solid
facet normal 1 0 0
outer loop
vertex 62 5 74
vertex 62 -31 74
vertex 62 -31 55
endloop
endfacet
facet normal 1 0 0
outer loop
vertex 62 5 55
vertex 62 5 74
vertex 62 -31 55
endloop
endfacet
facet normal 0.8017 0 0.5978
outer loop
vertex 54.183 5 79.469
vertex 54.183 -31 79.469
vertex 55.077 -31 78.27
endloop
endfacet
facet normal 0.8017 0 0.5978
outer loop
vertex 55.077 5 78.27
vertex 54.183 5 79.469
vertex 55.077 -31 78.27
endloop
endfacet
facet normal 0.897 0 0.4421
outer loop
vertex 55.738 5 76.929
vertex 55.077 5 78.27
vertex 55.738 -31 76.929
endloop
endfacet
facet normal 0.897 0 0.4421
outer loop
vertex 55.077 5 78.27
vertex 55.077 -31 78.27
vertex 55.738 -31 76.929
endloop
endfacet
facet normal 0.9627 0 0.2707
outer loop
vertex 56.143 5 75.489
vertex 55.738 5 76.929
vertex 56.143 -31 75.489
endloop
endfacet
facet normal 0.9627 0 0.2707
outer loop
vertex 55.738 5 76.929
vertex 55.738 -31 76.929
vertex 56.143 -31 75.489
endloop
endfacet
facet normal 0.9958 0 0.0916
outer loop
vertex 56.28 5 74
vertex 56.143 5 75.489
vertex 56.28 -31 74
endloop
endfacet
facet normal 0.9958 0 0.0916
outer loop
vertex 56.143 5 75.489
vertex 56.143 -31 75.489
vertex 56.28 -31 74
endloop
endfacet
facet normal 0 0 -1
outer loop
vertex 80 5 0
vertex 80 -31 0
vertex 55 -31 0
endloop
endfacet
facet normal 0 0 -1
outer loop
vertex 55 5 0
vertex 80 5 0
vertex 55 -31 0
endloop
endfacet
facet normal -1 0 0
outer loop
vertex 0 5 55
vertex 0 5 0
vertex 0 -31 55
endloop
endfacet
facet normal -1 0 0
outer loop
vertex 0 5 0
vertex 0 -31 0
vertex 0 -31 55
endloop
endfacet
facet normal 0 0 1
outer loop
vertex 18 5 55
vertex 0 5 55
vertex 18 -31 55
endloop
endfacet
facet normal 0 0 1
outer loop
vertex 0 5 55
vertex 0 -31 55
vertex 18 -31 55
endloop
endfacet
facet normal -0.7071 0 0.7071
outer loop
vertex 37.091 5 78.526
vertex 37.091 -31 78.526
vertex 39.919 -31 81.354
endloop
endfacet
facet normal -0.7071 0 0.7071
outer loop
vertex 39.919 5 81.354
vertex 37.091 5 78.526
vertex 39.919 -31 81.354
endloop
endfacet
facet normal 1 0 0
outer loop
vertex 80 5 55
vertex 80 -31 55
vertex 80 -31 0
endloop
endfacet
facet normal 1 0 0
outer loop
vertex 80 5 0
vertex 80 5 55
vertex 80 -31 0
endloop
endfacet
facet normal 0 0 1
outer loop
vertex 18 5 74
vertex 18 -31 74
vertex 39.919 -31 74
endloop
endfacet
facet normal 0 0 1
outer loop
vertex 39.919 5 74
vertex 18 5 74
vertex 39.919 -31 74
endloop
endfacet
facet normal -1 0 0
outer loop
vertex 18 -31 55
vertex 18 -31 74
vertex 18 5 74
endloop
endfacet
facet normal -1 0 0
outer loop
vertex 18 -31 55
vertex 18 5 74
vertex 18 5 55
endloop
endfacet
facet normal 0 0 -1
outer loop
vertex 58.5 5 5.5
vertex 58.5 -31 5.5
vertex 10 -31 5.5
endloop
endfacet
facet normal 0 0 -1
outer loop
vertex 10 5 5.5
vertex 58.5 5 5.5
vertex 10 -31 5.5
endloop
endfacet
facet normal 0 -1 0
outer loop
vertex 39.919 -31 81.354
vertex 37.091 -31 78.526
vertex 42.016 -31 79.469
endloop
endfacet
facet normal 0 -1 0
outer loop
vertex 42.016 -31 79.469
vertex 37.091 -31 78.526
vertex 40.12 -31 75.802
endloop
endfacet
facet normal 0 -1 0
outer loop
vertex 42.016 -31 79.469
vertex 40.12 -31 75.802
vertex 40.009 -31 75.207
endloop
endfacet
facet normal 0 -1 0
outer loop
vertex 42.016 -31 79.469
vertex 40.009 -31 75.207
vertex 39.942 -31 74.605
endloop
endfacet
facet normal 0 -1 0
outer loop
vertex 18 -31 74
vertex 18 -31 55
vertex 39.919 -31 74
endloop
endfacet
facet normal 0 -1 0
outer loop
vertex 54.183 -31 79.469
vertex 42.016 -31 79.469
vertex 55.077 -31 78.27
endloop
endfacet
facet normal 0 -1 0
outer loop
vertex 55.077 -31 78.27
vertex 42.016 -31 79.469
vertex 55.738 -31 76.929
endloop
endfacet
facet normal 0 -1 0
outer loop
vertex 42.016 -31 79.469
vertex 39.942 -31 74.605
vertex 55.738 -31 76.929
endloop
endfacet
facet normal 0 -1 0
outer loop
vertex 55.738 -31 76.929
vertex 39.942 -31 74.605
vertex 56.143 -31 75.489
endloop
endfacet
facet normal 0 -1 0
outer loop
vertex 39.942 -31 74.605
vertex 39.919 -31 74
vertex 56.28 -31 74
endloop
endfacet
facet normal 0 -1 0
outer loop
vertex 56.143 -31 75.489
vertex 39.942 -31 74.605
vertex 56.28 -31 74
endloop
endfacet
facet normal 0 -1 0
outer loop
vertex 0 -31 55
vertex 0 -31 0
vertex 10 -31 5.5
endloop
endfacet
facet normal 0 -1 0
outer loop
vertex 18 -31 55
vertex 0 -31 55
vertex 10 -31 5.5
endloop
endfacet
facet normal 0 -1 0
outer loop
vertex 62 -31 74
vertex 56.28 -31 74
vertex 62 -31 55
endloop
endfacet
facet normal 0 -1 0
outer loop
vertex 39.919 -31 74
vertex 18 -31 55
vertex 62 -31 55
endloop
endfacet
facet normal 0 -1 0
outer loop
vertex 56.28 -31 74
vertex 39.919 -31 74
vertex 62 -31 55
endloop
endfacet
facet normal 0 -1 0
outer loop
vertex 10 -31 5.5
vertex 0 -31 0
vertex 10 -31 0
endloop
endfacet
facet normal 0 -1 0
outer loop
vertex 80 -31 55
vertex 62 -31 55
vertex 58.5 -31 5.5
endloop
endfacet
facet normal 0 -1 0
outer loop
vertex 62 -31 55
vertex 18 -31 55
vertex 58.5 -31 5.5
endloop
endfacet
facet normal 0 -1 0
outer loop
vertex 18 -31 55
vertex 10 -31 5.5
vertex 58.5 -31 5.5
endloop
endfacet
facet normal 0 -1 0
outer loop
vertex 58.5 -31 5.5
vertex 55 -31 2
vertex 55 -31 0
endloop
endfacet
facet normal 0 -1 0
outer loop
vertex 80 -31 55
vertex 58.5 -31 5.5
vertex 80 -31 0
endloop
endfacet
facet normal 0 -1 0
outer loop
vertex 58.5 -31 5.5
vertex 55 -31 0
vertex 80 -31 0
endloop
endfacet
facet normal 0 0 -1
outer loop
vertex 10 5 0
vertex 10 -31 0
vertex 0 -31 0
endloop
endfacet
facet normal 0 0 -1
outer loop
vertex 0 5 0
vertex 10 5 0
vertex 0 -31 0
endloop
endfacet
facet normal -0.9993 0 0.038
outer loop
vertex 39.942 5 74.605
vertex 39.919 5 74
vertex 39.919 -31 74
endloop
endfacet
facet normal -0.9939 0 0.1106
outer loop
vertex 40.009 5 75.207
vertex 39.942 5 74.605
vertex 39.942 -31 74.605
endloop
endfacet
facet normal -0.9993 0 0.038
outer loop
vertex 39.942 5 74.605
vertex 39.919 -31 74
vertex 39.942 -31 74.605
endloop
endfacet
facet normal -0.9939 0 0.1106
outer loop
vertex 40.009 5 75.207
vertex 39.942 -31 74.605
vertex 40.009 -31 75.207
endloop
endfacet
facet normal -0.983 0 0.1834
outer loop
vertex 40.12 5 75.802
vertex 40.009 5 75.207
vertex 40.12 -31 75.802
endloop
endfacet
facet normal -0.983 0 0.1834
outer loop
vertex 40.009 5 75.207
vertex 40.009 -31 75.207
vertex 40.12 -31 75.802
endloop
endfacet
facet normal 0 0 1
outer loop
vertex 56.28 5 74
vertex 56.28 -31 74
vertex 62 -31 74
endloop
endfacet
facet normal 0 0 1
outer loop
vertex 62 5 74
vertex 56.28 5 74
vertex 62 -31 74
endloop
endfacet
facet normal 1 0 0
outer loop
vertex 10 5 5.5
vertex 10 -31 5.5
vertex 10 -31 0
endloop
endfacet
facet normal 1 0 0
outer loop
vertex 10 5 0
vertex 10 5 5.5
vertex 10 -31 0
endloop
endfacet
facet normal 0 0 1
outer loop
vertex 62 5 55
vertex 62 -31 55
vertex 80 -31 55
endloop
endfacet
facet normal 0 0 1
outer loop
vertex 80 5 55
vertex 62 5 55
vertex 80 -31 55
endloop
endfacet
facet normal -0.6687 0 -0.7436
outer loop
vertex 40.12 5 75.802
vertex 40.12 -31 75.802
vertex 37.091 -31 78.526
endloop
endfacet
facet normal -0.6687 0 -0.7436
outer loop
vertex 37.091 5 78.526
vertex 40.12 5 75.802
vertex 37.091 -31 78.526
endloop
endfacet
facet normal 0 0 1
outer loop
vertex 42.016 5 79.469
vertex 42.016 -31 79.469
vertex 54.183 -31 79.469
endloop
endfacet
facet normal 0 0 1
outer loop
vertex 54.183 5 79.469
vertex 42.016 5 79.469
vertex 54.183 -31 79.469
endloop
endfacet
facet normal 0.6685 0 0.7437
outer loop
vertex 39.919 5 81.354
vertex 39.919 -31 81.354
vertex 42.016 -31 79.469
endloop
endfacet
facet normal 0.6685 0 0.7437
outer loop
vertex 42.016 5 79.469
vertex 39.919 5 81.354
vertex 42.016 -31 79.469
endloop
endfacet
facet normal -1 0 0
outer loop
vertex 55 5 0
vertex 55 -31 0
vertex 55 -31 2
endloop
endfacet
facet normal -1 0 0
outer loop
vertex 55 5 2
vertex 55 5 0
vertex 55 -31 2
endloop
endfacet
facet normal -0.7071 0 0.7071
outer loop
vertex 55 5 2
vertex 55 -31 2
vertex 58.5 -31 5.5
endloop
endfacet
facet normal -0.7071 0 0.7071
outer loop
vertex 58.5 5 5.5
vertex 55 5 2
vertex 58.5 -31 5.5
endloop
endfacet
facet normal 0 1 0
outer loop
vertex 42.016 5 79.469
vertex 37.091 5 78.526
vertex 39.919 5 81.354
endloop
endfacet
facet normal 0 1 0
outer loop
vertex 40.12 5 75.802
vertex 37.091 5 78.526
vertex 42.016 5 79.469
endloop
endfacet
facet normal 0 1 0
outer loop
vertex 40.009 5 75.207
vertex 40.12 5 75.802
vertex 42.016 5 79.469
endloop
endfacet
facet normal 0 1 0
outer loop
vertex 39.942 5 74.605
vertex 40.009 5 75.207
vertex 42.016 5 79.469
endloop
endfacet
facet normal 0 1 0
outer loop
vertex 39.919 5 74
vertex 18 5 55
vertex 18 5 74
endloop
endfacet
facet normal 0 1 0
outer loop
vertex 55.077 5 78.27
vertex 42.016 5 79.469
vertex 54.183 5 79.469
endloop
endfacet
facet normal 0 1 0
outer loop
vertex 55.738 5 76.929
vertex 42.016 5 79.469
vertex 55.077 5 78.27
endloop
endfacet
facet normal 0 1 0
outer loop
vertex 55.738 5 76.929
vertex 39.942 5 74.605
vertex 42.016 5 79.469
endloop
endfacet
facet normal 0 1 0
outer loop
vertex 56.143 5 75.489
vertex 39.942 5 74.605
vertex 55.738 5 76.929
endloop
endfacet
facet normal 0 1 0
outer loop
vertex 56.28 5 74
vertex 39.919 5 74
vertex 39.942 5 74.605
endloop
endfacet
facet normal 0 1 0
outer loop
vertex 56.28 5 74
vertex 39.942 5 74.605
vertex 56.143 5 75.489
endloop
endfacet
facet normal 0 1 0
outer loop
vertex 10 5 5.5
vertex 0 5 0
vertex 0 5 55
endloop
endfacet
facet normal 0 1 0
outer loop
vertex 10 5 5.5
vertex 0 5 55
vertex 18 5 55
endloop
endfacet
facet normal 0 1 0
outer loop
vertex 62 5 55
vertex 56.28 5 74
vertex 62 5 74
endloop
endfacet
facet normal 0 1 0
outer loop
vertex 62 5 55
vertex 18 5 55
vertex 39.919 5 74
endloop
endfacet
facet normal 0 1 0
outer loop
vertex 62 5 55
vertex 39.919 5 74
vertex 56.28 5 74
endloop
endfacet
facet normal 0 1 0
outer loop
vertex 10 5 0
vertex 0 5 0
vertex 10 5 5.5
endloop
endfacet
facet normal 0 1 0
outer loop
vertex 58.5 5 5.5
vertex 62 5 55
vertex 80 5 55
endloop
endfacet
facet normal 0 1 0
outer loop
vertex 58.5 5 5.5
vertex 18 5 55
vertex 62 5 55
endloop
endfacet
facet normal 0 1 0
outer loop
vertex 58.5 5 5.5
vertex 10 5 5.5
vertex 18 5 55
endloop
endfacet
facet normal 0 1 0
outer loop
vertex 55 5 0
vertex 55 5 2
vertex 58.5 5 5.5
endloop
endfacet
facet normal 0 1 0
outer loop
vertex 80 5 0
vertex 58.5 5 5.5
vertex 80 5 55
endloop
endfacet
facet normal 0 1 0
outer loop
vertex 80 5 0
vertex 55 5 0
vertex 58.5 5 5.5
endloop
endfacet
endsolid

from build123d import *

# Parameters (mm, degrees)
SKETCH_6_W          = 80
SKETCH_6_H          = 31
EXTRUDE_1_DEPTH     = 85
SKETCH_8_W          = 18
SKETCH_8_H          = 30
CUT_EXTRUDE_1_DEPTH = 100
SKETCH_9_W          = 44
SKETCH_9_H          = 30
EXTRUDE_3_DEPTH     = 5
CUT_EXTRUDE_2_DEPTH = 110


with BuildPart() as part:
    # 草图6 → 凸台-拉伸1 (new body)
    with BuildSketch(Plane.XY):
        with Locations((40, -15.5)):
            Rectangle(SKETCH_6_W, SKETCH_6_H)
    extrude(amount=EXTRUDE_1_DEPTH)

    # 草图8 → 切除-拉伸1 (cut)
    with BuildSketch(Plane(origin=(0, 0, 0), x_dir=(1, 0, 0), z_dir=(0, 1, 0))):
        with Locations((71, -70)):
            Rectangle(SKETCH_8_W, SKETCH_8_H)
        with Locations((9, -70)):
            Rectangle(SKETCH_8_W, SKETCH_8_H)
    extrude(amount=-CUT_EXTRUDE_1_DEPTH, mode=Mode.SUBTRACT)

    # 草图9 → 凸台-拉伸3 (add)
    with BuildSketch(Plane(origin=(0, 0, 0), x_dir=(1, 0, 0), z_dir=(0, 1, 0))):
        Polygon((18, -55), (62, -55), (80, -55), (80, 0), (0, 0), (0, -55), align=None)
        with Locations((40, -70)):
            Rectangle(SKETCH_9_W, SKETCH_9_H)
    extrude(amount=EXTRUDE_3_DEPTH)

    # 草图10 → 切除-拉伸2 (cut)
    with BuildSketch(Plane.XZ.offset(31)):
        Polygon((10, 0), (55, 0), (55, 2), (58.5, 5.5), (10, 5.5), align=None)
        with BuildLine():
            Line((39.91937897, 81.354169844), (42.016320752, 79.468982831))
            Line((42.016320752, 79.468982831), (54.182900006, 79.468982831))
            ThreePointArc((54.182900006, 79.468982831), (55.737637047, 76.92860624), (56.279841788, 74))
            Line((56.279841788, 74), (62, 74))
            Line((62, 74), (62, 85))
            Line((62, 85), (18, 85))
            Line((18, 85), (18, 74))
            Line((18, 74), (39.91937897, 74))
            ThreePointArc((39.91937897, 74), (39.969784262, 74.906704585), (40.120378957, 75.802235229))
            Line((40.120378957, 75.802235229), (37.090951845, 78.52574272))
            Line((37.090951845, 78.52574272), (39.91937897, 81.354169844))
        make_face()
    extrude(amount=-CUT_EXTRUDE_2_DEPTH, mode=Mode.SUBTRACT)


solid = part.part
